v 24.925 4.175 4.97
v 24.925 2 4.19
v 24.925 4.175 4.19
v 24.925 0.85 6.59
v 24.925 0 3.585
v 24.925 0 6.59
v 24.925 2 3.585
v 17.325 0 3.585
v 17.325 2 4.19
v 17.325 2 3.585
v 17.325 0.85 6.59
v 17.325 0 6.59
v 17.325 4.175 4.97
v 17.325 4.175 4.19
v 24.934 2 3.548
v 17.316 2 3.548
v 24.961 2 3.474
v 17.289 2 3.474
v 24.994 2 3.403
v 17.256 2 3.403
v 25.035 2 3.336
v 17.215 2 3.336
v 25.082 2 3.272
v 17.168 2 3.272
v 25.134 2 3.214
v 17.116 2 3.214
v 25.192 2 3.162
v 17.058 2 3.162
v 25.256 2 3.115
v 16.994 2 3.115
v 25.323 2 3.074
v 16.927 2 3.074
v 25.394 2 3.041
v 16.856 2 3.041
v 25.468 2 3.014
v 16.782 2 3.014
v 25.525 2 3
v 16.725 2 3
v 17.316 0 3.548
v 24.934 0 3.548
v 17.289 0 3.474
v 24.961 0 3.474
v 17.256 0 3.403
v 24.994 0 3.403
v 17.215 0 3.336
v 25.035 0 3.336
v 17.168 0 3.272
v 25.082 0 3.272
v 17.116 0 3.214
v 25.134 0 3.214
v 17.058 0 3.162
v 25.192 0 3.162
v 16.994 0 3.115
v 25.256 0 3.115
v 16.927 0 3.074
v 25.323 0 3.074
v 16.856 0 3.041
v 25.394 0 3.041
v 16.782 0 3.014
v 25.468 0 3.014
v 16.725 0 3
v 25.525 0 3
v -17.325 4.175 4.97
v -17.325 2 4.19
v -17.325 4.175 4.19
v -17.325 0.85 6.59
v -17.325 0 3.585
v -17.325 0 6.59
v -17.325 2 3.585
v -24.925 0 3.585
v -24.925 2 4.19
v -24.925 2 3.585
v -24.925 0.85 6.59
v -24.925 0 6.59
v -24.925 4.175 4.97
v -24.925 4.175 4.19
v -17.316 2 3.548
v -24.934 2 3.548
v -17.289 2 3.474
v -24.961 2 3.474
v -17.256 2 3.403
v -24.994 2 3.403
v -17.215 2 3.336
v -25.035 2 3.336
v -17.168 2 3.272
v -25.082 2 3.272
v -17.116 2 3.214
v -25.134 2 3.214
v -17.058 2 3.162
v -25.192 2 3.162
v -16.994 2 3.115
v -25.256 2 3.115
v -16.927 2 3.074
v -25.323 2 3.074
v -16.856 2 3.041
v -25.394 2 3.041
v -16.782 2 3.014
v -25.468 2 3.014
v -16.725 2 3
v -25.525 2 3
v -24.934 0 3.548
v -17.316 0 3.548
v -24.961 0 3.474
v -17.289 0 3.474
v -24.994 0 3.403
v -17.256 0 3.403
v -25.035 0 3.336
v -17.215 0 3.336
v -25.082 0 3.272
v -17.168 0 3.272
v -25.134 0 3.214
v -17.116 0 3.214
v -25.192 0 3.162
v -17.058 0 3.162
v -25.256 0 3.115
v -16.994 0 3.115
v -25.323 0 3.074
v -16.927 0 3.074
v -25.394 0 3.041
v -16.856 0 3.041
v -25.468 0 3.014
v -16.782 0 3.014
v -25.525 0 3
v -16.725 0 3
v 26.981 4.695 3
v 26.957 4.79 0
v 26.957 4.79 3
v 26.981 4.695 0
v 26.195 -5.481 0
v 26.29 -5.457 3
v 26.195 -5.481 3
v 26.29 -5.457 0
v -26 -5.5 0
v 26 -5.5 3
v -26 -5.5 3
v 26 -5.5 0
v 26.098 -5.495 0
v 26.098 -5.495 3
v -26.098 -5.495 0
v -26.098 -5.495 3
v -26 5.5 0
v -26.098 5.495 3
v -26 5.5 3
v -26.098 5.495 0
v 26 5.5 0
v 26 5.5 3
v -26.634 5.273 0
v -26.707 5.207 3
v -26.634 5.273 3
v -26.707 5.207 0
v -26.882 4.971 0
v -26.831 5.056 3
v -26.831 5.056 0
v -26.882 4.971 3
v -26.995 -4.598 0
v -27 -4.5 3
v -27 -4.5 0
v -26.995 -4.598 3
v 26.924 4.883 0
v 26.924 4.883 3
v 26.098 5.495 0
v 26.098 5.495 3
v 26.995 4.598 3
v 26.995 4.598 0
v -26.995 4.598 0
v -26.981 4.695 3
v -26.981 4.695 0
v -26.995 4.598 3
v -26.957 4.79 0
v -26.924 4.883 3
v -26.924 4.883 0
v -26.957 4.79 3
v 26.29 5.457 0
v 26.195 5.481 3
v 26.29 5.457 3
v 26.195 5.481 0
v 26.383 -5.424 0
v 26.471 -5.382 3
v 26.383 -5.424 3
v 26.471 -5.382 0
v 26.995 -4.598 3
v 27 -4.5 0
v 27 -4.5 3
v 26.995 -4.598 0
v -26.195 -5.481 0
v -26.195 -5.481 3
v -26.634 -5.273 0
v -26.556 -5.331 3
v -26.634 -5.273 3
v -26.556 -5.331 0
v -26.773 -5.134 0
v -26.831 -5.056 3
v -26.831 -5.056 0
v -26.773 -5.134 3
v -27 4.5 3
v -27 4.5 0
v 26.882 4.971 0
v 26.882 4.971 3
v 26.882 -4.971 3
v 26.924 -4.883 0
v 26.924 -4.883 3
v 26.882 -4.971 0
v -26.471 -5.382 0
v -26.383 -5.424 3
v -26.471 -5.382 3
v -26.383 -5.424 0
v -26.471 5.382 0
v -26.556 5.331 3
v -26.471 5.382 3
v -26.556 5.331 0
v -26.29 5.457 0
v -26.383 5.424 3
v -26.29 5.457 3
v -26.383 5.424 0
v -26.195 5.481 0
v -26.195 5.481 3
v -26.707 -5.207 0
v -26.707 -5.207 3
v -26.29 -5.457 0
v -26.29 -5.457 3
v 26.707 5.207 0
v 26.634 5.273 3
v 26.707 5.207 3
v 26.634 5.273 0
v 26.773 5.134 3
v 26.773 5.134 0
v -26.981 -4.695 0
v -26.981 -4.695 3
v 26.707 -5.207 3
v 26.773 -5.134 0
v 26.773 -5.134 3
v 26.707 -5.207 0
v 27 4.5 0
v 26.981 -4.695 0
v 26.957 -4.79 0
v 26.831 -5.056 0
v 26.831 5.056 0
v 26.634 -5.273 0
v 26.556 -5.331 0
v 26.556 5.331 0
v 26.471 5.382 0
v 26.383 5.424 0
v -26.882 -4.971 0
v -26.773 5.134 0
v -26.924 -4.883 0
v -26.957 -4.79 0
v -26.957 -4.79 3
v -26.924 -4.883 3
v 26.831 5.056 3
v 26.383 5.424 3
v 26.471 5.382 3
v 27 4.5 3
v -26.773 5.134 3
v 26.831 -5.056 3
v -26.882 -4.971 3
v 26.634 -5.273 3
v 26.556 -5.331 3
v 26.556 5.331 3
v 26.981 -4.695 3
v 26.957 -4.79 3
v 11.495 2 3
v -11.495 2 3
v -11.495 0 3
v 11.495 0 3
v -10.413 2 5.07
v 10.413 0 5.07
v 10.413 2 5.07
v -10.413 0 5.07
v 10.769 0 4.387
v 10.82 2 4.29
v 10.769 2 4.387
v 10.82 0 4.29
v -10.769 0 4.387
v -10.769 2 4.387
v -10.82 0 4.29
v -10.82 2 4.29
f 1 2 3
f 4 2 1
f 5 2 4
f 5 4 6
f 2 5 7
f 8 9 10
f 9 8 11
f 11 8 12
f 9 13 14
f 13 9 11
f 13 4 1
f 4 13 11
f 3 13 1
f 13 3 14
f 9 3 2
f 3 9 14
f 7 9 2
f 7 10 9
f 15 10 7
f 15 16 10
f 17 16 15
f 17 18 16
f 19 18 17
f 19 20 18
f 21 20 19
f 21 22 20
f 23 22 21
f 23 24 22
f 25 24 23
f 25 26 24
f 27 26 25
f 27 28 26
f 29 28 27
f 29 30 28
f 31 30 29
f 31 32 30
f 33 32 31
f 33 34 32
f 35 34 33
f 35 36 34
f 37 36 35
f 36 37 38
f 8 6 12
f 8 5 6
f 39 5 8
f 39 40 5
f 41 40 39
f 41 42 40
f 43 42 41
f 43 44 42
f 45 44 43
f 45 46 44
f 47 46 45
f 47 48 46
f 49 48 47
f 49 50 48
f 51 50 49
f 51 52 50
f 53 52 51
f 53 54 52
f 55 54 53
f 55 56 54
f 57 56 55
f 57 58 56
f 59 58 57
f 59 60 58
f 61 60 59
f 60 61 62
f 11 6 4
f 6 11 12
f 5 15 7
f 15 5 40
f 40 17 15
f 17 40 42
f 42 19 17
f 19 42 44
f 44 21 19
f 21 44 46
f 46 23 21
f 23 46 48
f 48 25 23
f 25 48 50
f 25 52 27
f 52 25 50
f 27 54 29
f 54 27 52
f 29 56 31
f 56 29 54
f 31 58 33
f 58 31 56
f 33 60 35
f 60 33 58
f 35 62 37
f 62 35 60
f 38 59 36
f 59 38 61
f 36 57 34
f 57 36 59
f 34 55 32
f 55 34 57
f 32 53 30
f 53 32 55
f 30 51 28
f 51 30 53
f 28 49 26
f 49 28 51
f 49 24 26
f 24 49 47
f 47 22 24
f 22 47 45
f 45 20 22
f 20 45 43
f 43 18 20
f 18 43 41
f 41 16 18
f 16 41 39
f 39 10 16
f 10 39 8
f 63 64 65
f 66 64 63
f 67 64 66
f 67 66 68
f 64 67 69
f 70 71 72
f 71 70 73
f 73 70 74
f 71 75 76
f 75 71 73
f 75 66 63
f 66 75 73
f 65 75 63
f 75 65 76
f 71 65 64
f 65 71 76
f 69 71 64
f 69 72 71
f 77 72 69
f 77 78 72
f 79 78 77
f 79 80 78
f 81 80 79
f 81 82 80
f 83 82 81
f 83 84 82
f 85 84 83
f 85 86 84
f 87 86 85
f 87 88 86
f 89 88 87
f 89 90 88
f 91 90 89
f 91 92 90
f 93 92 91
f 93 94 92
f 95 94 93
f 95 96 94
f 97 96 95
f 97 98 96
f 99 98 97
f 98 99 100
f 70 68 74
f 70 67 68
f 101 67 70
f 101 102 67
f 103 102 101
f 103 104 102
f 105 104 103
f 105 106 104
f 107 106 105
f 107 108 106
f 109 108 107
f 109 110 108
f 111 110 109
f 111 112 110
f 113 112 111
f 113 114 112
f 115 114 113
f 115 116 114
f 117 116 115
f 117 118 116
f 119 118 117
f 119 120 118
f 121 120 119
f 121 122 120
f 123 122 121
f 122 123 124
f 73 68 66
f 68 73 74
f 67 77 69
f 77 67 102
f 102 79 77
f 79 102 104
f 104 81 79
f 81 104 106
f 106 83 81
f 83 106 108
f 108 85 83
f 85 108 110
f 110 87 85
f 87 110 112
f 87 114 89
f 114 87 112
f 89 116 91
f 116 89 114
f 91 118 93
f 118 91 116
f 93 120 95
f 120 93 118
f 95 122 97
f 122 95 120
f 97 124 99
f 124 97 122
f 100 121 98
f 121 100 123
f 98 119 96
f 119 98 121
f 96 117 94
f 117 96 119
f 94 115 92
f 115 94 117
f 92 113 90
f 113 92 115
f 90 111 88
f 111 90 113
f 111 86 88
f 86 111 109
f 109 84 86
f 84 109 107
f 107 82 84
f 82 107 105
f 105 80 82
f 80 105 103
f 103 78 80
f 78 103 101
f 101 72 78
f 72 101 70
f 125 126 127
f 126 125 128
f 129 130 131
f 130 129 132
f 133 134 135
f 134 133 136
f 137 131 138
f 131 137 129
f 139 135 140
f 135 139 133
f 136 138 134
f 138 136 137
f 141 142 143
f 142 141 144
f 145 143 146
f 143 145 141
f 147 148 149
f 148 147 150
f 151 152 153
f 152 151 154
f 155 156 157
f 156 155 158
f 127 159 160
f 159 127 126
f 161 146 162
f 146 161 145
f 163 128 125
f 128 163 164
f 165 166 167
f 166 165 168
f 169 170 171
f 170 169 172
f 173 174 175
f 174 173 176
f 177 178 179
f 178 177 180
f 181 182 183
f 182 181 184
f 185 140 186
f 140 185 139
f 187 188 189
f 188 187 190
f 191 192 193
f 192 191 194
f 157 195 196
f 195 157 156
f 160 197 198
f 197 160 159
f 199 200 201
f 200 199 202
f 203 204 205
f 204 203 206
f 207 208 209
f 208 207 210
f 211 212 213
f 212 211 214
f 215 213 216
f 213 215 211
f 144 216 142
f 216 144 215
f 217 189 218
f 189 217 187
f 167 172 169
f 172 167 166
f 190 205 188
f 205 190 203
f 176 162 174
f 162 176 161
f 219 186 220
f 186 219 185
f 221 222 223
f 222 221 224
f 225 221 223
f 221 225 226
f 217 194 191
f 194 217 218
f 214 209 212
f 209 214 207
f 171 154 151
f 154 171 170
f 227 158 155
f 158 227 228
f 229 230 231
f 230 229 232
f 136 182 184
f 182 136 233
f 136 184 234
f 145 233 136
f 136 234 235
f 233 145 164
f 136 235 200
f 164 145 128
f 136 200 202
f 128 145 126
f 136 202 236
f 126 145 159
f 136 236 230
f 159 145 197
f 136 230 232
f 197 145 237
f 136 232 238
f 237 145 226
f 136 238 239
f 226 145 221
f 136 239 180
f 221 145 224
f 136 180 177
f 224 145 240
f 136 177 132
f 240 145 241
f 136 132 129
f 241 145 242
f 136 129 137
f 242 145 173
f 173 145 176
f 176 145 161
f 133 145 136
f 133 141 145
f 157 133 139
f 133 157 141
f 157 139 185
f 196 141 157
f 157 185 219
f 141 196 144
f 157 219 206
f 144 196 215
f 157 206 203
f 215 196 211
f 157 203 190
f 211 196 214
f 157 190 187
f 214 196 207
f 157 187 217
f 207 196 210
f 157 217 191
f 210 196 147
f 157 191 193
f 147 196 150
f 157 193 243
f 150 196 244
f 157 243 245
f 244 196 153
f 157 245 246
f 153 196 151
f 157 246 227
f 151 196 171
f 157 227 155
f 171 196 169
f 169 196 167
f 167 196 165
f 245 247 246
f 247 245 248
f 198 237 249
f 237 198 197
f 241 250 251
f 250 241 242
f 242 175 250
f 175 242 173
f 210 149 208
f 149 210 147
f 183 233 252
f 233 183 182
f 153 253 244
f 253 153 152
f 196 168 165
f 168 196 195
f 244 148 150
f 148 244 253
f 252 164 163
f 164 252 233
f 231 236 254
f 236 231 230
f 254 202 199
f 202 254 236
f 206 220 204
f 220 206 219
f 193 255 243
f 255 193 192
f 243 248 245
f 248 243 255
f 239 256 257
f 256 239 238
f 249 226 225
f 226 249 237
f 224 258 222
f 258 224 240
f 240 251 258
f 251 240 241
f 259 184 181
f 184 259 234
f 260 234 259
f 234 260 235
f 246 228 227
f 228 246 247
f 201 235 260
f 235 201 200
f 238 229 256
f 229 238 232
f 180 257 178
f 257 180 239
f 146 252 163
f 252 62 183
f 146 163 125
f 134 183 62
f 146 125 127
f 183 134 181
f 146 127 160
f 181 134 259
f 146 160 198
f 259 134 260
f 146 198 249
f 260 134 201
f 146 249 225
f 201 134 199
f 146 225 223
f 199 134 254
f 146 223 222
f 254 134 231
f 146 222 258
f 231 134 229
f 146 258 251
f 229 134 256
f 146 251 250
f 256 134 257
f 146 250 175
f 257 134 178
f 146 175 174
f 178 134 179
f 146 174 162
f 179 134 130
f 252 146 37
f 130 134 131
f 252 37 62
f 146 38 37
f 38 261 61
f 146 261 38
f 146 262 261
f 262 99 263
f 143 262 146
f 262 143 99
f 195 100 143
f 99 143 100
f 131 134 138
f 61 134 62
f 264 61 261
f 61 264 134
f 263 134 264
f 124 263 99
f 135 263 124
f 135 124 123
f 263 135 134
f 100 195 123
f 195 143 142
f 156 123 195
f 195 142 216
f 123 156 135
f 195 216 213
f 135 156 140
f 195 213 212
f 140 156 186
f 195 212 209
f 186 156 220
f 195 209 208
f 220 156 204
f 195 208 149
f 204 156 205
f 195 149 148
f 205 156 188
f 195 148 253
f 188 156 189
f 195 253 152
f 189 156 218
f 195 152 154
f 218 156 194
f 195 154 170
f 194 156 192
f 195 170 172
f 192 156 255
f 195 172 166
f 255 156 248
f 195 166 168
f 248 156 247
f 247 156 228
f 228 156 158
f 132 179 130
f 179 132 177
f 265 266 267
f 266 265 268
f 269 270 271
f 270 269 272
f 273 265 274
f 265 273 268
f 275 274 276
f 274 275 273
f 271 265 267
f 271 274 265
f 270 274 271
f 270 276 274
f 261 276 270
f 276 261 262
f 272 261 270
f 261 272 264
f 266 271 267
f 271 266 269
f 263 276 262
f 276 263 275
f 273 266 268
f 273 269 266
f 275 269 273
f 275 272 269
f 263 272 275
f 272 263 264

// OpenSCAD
// file: gusset.scad
//
// Copyright (c) Stewart H. Whitman, 2024.
//
// File:    gusset.scad
// Project: General
// License: CC BY-NC-SA 4.0 (Attribution-NonCommercial-ShareAlike)
// Desc:    Gusset shapes to fill in |_ corners
//

include <smidge.scad>;

// Quadrant Setting:
//        y
//       2|1
//      --+-- x
//       3|4

module round_gusset_2d( w, quadrant=1 ) {
  assert( is_num(quadrant) && (quadrant == 1 || quadrant==2 || quadrant==3 || quadrant==4) );

  quadrant_to_mirror = [ [0,0], [1,0], [1,1], [0,1] ];

  mirror( quadrant_to_mirror[quadrant-1] )
    difference() {
      square( [ w, w ] );
      translate( [w-SMIDGE,w-SMIDGE] ) circle( r=w );
    }
} // end round_gusset_2d

module oblate_gusset_2d( w, h, quadrant=1 ) {
  scale( [1,h/w] ) round_gusset_2d( w, quadrant );
} // end oblate_gusset_2d

module round_gusset_3d( w, d, quadrant=1 ) {
  linear_extrude( height=d ) round_gusset_2d( w, quadrant );
} // end round_gusset_3d

module oblate_gusset_3d( w, h, d, quadrant=1 ) {
  linear_extrude( height=d ) oblate_gusset_2d( w, h, quadrant );
} // end oblate_gusset_3d

//round_gusset_2d( 10, quadrant=1 );
//oblate_gusset_2d( 10, 20, quadrant=2 );
//round_gusset_3d( 10, 1, quadrant=3 );
//oblate_gusset_3d( 10, 20, 1, quadrant=4 );
// file: mitered.scad
//
// Copyright (c) Stewart H. Whitman, 2024.
//
// File:    mitered.scad
// Project: General
// License: CC BY-NC-SA 4.0 (Attribution-NonCommercial-ShareAlike)
// Desc:    Mitered cube utilities
//

include <rounded.scad>;

// mitered_adjusted_square:
//
// Get the square <size> adjusted for angular expansion.
//
function mitered_adjusted_square( size, x_angle, y_angle ) =
   [ size.x, size.y ] + 2*size.z*[ 1/tan(x_angle), 1/tan(y_angle) ];

// mitered_cube:
//
// Scale a cube of <size> with angles of <x_angle> and <y_angle>. If not <inside>
// then the cube base is expanded and the top will be <size>, otherwise the
// base is retained and the top will be shrunken.
//
module mitered_cube( size, x_angle=90, y_angle=90, inside=true ) {
  assert( is_list( size ) );
  assert( len( size ) == 3 );
  assert( is_num( x_angle ) );
  assert( is_num( y_angle ) );

  if( size.z > 0 ) {
    assert( size.x > 0 );
    assert( size.y > 0 );

    // Calculate squares
    smaller_size = [ size.x, size.y ];
    larger_size  = mitered_adjusted_square( size, x_angle, y_angle );

    // Sanity check sizes
    assert( larger_size.x > 0 );
    assert( larger_size.y > 0 );

    // Scale always larger to smaller
    scale_factor = [ smaller_size.x / larger_size.x, smaller_size.y / larger_size.y ];

    // Extrude a scaled square
    linear_extrude( height=size.z, scale=scale_factor )
      square( inside ? smaller_size : larger_size, center=true );
  }
} // end mitered_cube

// mitered_rounded_cube:
//
// Scale a rounded cube of <size> with angles of <x_angle> and <y_angle>. If not <inside>
// then the cube base is expanded and the top will be <size>, otherwise the
// base is retained and the top will be shrunken.
//
module mitered_rounded_cube( size, radius=0, x_angle=90, y_angle=90, inside=true ) {
  assert( is_list( size ) );
  assert( len( size ) == 3 );
  assert( is_num( x_angle ) );
  assert( is_num( y_angle ) );
  assert( is_num( radius ) );

  if( size.z > 0 ) {
    assert( size.x > 0 );
    assert( size.y > 0 );

    // Calculate squares
    smaller_size = [ size.x, size.y ];
    larger_size  = mitered_adjusted_square( size, x_angle, y_angle );

    // Sanity check sizes
    assert( larger_size.x > 0 );
    assert( larger_size.y > 0 );

    // Scale always larger to smaller
    scale_factor = [ smaller_size.x / larger_size.x, smaller_size.y / larger_size.y ];

    // Extrude a scaled square
    linear_extrude( height=size.z, scale=scale_factor )
      rounded_side_square( inside ? smaller_size : larger_size, radius, center=true );
  }
} // end mitered_rounded_cube

//mitered_cube( [10,4,3], x_angle=30 );
//translate( [0,6,0] ) mitered_cube( [10,4,3], x_angle=30, inside=false );
//translate( [0,12,0] ) mitered_cube( [10,4,3], x_angle=60, y_angle=20, inside=true );
//mitered_cube( [10,4,3], x_angle=30 );
//translate( [0,6,0] ) mitered_cube( [10,4,3], x_angle=30, inside=false );
//translate( [0,12,0] ) mitered_cube( [10,4,3], x_angle=60, y_angle=20, inside=true );
// file: rounded.scad
//
// Copyright (c) Stewart H. Whitman, 2020-2024.
//
// File:    rounded.scad
// Project: General
// License: CC BY-NC-SA 4.0 (Attribution-NonCommercial-ShareAlike)
// Desc:    Rounded square/cube/cylinder utilities
//

// rounded_side_square:
//
// Generate a square of <size> with a round-over <radius> in
// the X and Y directions. Centered optionally like a square.
//
module rounded_side_square( size, radius, center=false ) {
  assert( is_num(size) || is_list(size) );
  assert( is_num(radius) && radius >= 0 );

  c = is_list(size) ? size : [size,size];

  assert( len(c) == 2 );
  assert( is_num(c.x) );
  assert( is_num(c.y) );
  assert( c.x > 2*radius );
  assert( c.y > 2*radius );

  offset( r=radius )
    offset( delta=-radius )
      square( c, center=center );
} // end rounded_side_square

// rounded_side_cube:
//
// Generate a cube of <size> with a round-over <radius> in
// the X and Y directions. Centered optionally like a cube.
//
module rounded_side_cube( size, radius, center=false ) {
  assert( is_num(size) || is_list(size) );

  c = is_list(size) ? size : [size,size,size];

  assert( len(c) == 3 );
  assert( is_num(c.z) );

  linear_extrude( height=c.z, center=center )
    rounded_side_square( [c.x,c.y], radius, center );
} // end rounded_side_cube

// rounded_side_cube_upper:
//
// Generate a cube of <size> with a round-over <radius> in
// the X and Y directions. The object is centered on X and Y but
// with Z positive.
//
module rounded_side_cube_upper( size, radius ) {
  assert( is_num(size) || is_list(size) );

  c = is_list(size) ? size : [size,size,size];

  assert( len(c) == 3 );
  assert( is_num(c.z) );

  linear_extrude( height=c.z )
    rounded_side_square( [c.x,c.y], radius, true );
} // end rounded_side_cube_upper

// rounded_top_cylinder:
//
// Generate a cylinder with a rounded top, with <d,r,h> parameters
// like cylinder, but <radius> defines the round-over radius.
//
module rounded_top_cylinder( h, d, r, radius, center=false ) {
  assert( is_num(h) && h > 0 );
  assert( (is_undef(r) || is_undef(d)) && (is_num(r) || is_num(d)) ); // Not both
  assert( is_num(radius) );
  assert( h > radius );

  cylinder_radius = is_undef(d) ? r : d/2;
  assert( cylinder_radius > radius );

  translate( [0,0,(center?-h/2:0)] )
    rotate_extrude()
      intersection() {
        offset( r=+radius ) offset( delta=-radius ) square( [ 2*cylinder_radius, 2*h ], center=true );
        square( [cylinder_radius,h] );
      }
} // end rounded_top_cylinder

// rounded_top_and_bottom_cylinder:
//
// Generate a cylinder with a rounded top and bottom, with <d,r,h> parameters
// like cylinder, but <radius> defines the round-over radius.
//
module rounded_top_and_bottom_cylinder( h, d, r, radius, center=false ) {
  assert( is_num(h) && h > 0 );
  assert( (is_undef(r) || is_undef(d)) && (is_num(r) || is_num(d)) ); // Not both
  assert( is_num(radius) );
  assert( h > radius );

  cylinder_radius = is_undef(d) ? r : d/2;
  assert( cylinder_radius > radius );

  translate( [0,0,(center?-h/2:0)] )
    rotate_extrude()
      intersection() {
        translate( [-cylinder_radius, 0 ] ) offset( r=+radius ) offset( delta=-radius ) square( [ 2*cylinder_radius, h ], center=false );
	square( [cylinder_radius,h] );
      }
} // end rounded_top_and_bottom_cylinder

// rounded_top_cube:
//
// Generate a cube of <size> with a round-over <radius> in
// the X, Y, and top Z directions. Centered optionally like a cube.
//
module rounded_top_cube( size, radius, center=false ) {
  assert( is_num(size) || is_list(size) );
  assert( is_num(radius) && radius >= 0 );

  size_v = is_list(size) ? size : [size,size,size];

  rounded_top_volume( size_v, radius, center ? [0,0,0] : size_v/2 ) cube(size_v,center=center);
} // end rounded_top_cube

// rounded_top_cube_upper:
//
// Generate a cube of <size> with a round-over <radius> in
// the X, Y, and top Z directions. The object is centered on X and Y but
// with Z positive.
//
module rounded_top_cube_upper( size, radius ) {
  assert( is_num(size) || is_list(size) );

  size_v = is_list(size) ? size : [size,size,size];

  translate( [ 0, 0, size_v.z/2 ] ) rounded_top_cube( size_v, radius, center=true );
} // end rounded_top_cube_upper

// rounded_all_cube:
//
// Generate a cube of <size> with a round-over <radius> in
// all X, Y, and Z directions. Centered optionally like a cube.
//
module rounded_all_cube( size, radius, center=false ) {
  assert( is_num(size) || is_list(size) );
  assert( is_num(radius) && radius >= 0 );

  size_v = is_list(size) ? size : [size,size,size];

  rounded_all_volume( size_v, radius, center ? [0,0,0] : size_v/2 ) cube(size_v,center=center);
} // end rounded_all_cube

// rounded_all_cube_upper:
//
// Generate a cube of <size> with a round-over <radius> in
// all X, Y, and Z directions. The object is centered on X and Y but
// with Z positive.
//
module rounded_all_cube_upper( size, radius ) {
  assert( is_num(size) || is_list(size) );

  size_v = is_list(size) ? size : [size,size,size];

  translate( [ 0, 0, size_v.z/2 ] ) rounded_all_cube( size_v, radius, center=true );
} // end rounded_all_cube_upper

// rounded_top_volume:
//
// Operates on its children creating a round-over effect based
// on <radius>. Operations are:
//    1. Translate volume from <c> to origin
//    2. Scale X/Y volume down based-on the radius to be added in step 3
//    3. Minkowski with sphere adding 2*radius in all dimensions
//    4. Remove rounded over bottom radius:
//     a. Translate down a radius
//     b. Intersect with full volume
//    5. Restore volume to <c>
//
module rounded_top_volume( volume, radius, c=[0,0,0] ) {
  assert( is_num(radius) && radius >= 0 );
  assert( is_list(volume) && len(volume) == 3 );
  assert( is_num(volume.x) && volume.x > 2*radius );
  assert( is_num(volume.y) && volume.y > 2*radius );
  assert( is_list(c) && len(c) == 3 );

  if( radius > 0 ) {
    delta        = volume - 2*[radius, radius, 0];
    scale_factor = [delta.x/volume.x, delta.y/volume.y, 1 ];

    translate(c) intersection() {
      cube( volume, center=true );
      translate([0, 0, -radius ] ) minkowski() {
	scale( scale_factor ) translate(-c) children();
	sphere( r=radius );
      }
    }
  }
  else
    children();
} // end rounded_top_volume

// rounded_all_volume:
//
// Operates on its children creating a round-over effect based
// on <radius>. Operations are:
//    1. Translate volume from <c> to origin
//    2. Scale X/Y/Z volume down based-on the radius to be added in step 3
//    3. Minkowski with sphere adding 2*radius in all dimensions
//    4. Intersect with full volume
//    5. Restore volume to <c>
//
module rounded_all_volume( volume, radius, c=[0,0,0] ) {
  assert( is_num(radius) && radius >= 0 );
  assert( is_list(volume) && len(volume) == 3 );
  assert( is_num(volume.x) && volume.x > 2*radius );
  assert( is_num(volume.y) && volume.y > 2*radius );
  assert( is_num(volume.z) && volume.z > 2*radius );
  assert( is_list(c) && len(c) == 3 );

  if( radius > 0 ) {
    delta        = volume - 2*[radius, radius, radius];
    scale_factor = [delta.x/volume.x, delta.y/volume.y, delta.z/volume.z ];

    translate(c) intersection() {
      cube( volume, center=true );
      minkowski() {
	scale( scale_factor ) translate(-c) children();
	sphere( r=radius );
      }
    }
  }
  else
    children();
} // end rounded_all_volume
// file: smidge.scad
//
// Copyright (c) Stewart H. Whitman, 2021-2024.
//
// File:    smidge.scad
// Project: General
// License: CC BY-NC-SA 4.0 (Attribution-NonCommercial-ShareAlike)
// Desc:    SMIDGE constant used in preview mode.
//

// Smidge constant for rendering only (to avoid Z-axis fighting, etc.)
SMIDGE = 0.01;
// main file
//
// Copyright (c) Stewart H. Whitman, 2022-2024.
//
// File:    hp-z6-catch-top.scad
// Project: HP Z6 G4 Memory Fan Mounts
// License: CC BY-NC-SA 4.0 (Attribution-NonCommercial-ShareAlike)
// Desc:    HP Z6 G4 Top Front Fan Cage Catch Definitions
//

include <smidge.scad>;
include <rounded.scad>;
include <mitered.scad>;
include <gusset.scad>;

// Catch:
//
// Catch refers to the top area of the "mound". Radius
// is nominal.
//
// top_catch_size: length, width
top_catch_size = [ 54, 11 ];
top_catch_radius = 1;

// Slot:
//
// Two slots, centered atop the long axis and positioned
// symmetrically about the vertical center. Depth is the
// amount of "safe" space behind metal.
//
// top_slot_size: length, width, depth
top_slot_size = [ 8.25, 5.5, 4 ];
top_slot_separation = 34;
top_slot_centers = (top_slot_separation + top_slot_size.x)/2 * [ [ 1, 0 ], [ -1, 0 ] ];
top_slot_spacer = 1.2;
top_slot_gusset = 0.8;

// Box:
//
// Not really part of the catch, this is the depression
// between the slots in the center of the slots.
//
top_box_size = [ 23, top_slot_size.y-1.5, 2.6 ];
top_box_center = [ 0, 0 ];

// Fitting (tolerance) properties:
//
// These have been adapted to approximate the OEM tabs which measure:
//   [ width, height (excess), depth ] = [ 7.6, 1.4, 3.65 ]
//
top_tang_multiplier = [ 0.92, 0.9, 0.9 ];
//top_box_multiplier = 0.9;
top_box_multiplier = 0.8;
top_hollow_thickness = 0.8;

// For layout testing: (match main mount file)
top_layout_offsets = [6.3, 85.6, 9.055];

// top_catch_rounded_hollow: rounded hollow cube
module top_catch_rounded_hollow( size, radius, thickness ) {
  difference() {
    rounded_side_cube_upper( size, top_catch_radius/3);
    translate( [0,0,-SMIDGE] )
      rounded_side_cube_upper( size - 2 * [top_hollow_thickness, top_hollow_thickness, -SMIDGE ], top_catch_radius/3 );
  }
} // end top_catch_rounded_hollow

// top_tang_simple: angled tang
module top_tang_simple( tip_profile, tang_profile, notch_profile ) {
  assert( is_list(tip_profile) && len(tip_profile) == 3 );
  assert( is_list(tang_profile) && len(tang_profile) == 3 );
  assert( is_list(notch_profile) && len(notch_profile) == 2 );

  function round_to_tenths(v) = round(10*v)/10;

  tip_width     = tip_profile[0];
  tip_thickness = tip_profile[1];
  tip_depth     = tip_profile[2];

  tang_height_percentage = tang_profile[0];
  tang_angle             = tang_profile[1];
  tang_pivot_percentage  = tang_profile[2];

  tang_height            = tang_height_percentage / 100 * tip_thickness;
  tang_pivot             = tang_pivot_percentage / 100 * tip_thickness;

  notch_depth  = notch_profile[0];
  notch_height = notch_profile[1];

  tang_length = tang_height > 0 ? tang_pivot+(tip_thickness+tang_height/2)/tan(tang_angle) : 0;

  // y => thickness of the top
  // p => pivot point on the top
  // h => indent size
  // l => length of the tang
  // w => width of the tang
  let( y = tip_thickness, p = tang_pivot, h = round_to_tenths(tang_height), l = round_to_tenths(tang_length), w=round_to_tenths(tip_width), ni = notch_depth, nh = notch_height ) {
    //echo( "top tang [ width, height, depth ] =",  [w, h, l] );
    linear_extrude( height=w, center=true, convexity=20 ) {
      polygon([ [0,0], [0,nh], [ni,nh], [ni,y+h], [p,y+h], [l,+h/2], [l,0] ]);
    }
  }
} // end tang_simple

// top_tang_elliptical: ellipsoid tang
module top_tang_elliptical( tip_profile, tang_profile, notch_profile ) {
  assert( is_list(tip_profile) && len(tip_profile) == 3 );
  assert( is_list(tang_profile) && len(tang_profile) == 3 );
  assert( is_list(notch_profile) && len(notch_profile) == 2 );

  function round_to_tenths(v) = round(10*v)/10;

  tip_width     = tip_profile[0];
  tip_thickness = tip_profile[1];
  tip_depth     = tip_profile[2];

  tang_height_percentage = tang_profile[0];
  tang_angle             = tang_profile[1];
  tang_pivot_percentage  = tang_profile[2];

  tang_height = tang_height_percentage / 100 * tip_thickness + tip_thickness;
  tang_pivot  = tang_pivot_percentage  / 100 * tang_height;

  notch_depth  = notch_profile[0];
  notch_height = notch_profile[1];

  width_multiplier = 1.15;

  module ellipsoid(w, h, d) { scale([1, h/w, d/w]) sphere(r=w/2); }

  // h => height
  // w => width
  // d => depth
  // p => pivot height
  // o => pivot indent location (based on angle)
  let( h = round_to_tenths(tang_height), w = round_to_tenths(tip_width), d = round_to_tenths(tip_depth), p = tang_pivot, o = notch_depth + (h-p)*sin(tang_angle), ni = notch_depth, nh = notch_height ) {
    //echo( "top tang [ width, height, depth ] =",  [w, round_to_tenths(h-tip_thickness), d] );
    intersection() {
      // A little oversize across width (which will be clipped)
      ellipsoid( 2*d, 2*h, width_multiplier*w );

      // Bounding box
      linear_extrude( height=w, center=true, convexity=20 )
	polygon([ [0,0], [0,nh], [ni,nh], [ni,p], [o,h], [d,h], [d,0] ]);
    }
  }
} // end tang_elliptical

// top_catch_tang: the two top tangs
module top_catch_tang(style, thickness) {
  size = [ top_tang_multiplier.x * top_slot_size.x,
           top_tang_multiplier.y * top_slot_size.y,
           top_tang_multiplier.z * top_slot_size.z ];

  // none: nothing
  if( style == "none" ) {
    ;
  }
  // debug: just cubes (for fitting)
  else if( style == "debug" ) {
    rounded_side_cube_upper( top_slot_size, radius=0 );
  }
  // full: straight just scaled by percentage (for fitting)
  else if( style == "full" ) {
    top_catch_rounded_hollow( size, top_catch_radius/3, top_hollow_thickness );
  }
  // hook: insertion hooks
  else if( style == "hook" ) {
    // Width and height of hook
    tip_profile  = [ size.x, size.y/2, size.z ];

    // Profile of hook
    tang_profile = [ 70, 64, 80 ];

    // Profile of notch
    notch_profile = [ top_slot_spacer, thickness ];

    // Tang
    rotate( [0,-90,0] )
      top_tang_simple( tip_profile, tang_profile, notch_profile );

    // Gussets
    translate( [ +size.x/2-SMIDGE, 0, 0 ] ) rotate( [-90, -90, 0 ] ) round_gusset_3d( top_slot_gusset, thickness, quadrant=1 );
    translate( [ -size.x/2+SMIDGE, 0, 0 ] ) rotate( [-90, -90, 0 ] ) round_gusset_3d( top_slot_gusset, thickness, quadrant=4 );
  }
  // hook-elliptical:
  else if( style == "hook-elliptical" ) {
    // Width and height of hook
    tip_profile  = [ size.x, size.y/2, size.z ];

    // Profile of hook
    tang_profile = [ 70, 30, 70 ];

    // Profile of notch
    notch_profile = [ top_slot_spacer, thickness ];

    // Tang
    rotate( [0,-90,0] )
      top_tang_elliptical( tip_profile, tang_profile, notch_profile );

    // Gussets
    translate( [ +size.x/2-SMIDGE, 0, 0 ] ) rotate( [-90, -90, 0 ] ) round_gusset_3d( top_slot_gusset, thickness, quadrant=1 );
    translate( [ -size.x/2+SMIDGE, 0, 0 ] ) rotate( [-90, -90, 0 ] ) round_gusset_3d( top_slot_gusset, thickness, quadrant=4 );
  }
  else {
    assert( false, "top_catch_tang: style unknown!" );
  }
} // end top_catch_tang

// sparsifyX: remove a number of cells
module sparsifyX( cells, size, remainder ) {
  height = size.z - 2*remainder;
  if( height > 0 ) {
    count  = 2*cells+1;
    width  = size.x/count;

    cell_size = [ width, size.y+2*SMIDGE, height ];
    for( i = [1:count] ) {
      if( i%2==0 ) {
	translate( [width*i-size.x/2-width/2,0,remainder+height/2] )
	  cube( cell_size, center=true );
      }
    }
  }
} // end sparsifyX

module top_catch_base( style, height ) {
  size = concat( top_catch_size, height );

  if( style == "none" || height <= 0 ) {
    ;
  }
  // full: straight just scaled by percentage
  else if( style == "full" ) {
    rounded_side_cube_upper( size, top_catch_radius );
  }
  // layout: test out the distance to cage
  else if( style == "layout" ) {
    echo( "top tab layout offset =", top_layout_offsets );

    difference() {
      rounded_side_cube_upper( size, top_catch_radius );
      sparsifyX( 4, size, 2 );
    }

    // Down prong to bottom catch center
    {
      catch_center_to_bottom = size.z > 7 ? top_layout_offsets.y : 12;
      catch_center_to_mid    = -top_layout_offsets.x;
      translate( [-catch_center_to_mid,+catch_center_to_bottom/2,0] )
        rounded_side_cube_upper( [3, catch_center_to_bottom, min(size.z,3)], 0 );
    }
  }
  else {
    assert( false, "top_catch_base: style unknown!" );
  }
} // end top_catch_base

module top_catch_box(style,thickness) {
  size = [ top_box_size.x,
           top_box_size.y,
           (style == "full") ? top_box_size.z : top_box_multiplier*top_box_size.z ];

  // none: nothing
  if( style == "none" ) {
    ;
  }
  // debug: just flat panel
  else if( style == "debug" ) {
    // N.B.: show blocker position
    translate( [0,0,top_box_size.z] )
      rounded_side_cube_upper( [ size.x, size.y, 1 ], radius=0 );
  }
  // full: just a box
  else if( style == "full" ) {
    top_catch_rounded_hollow( size, top_catch_radius/3, top_hollow_thickness );
  }
  // hook: matching box for hooks
  else if( style == "hook" ) {
    translate( [0,thickness/2,0] )
      mitered_cube( [ size.x, thickness, size.z ], x_angle=60 );
  }
  else {
    assert( false, "top_catch_box: style unknown!" );
  }
} // end top_catch_box

module top_catch_fitting(height=3,base_style="full",tang_style="full",box_style="full",thickness=2) {
  assert( is_num(height) && height >= 0 );

  difference() {
    union() {
      // Base
      top_catch_base( base_style, height );

      // Box
      translate( concat( top_box_center, height-SMIDGE ) )
	top_catch_box( box_style, thickness );

      // Slot projection
      for( p = top_slot_centers )
        translate( concat( p, height-SMIDGE ) )
          top_catch_tang( tang_style, thickness );
    }
  }
} // end top_catch_fitting

// top_catch_get_size, top_catch_get_below_size:
//
// Returns [ length, width, height above/below case ]
//
function top_catch_get_size()         = concat( top_catch_size, top_slot_size.z );
function top_catch_get_slot_size()    = top_slot_size;
function top_catch_get_slot_centers() = top_slot_centers;
function top_catch_get_box_size()     = top_box_size;
function top_catch_get_box_center()   = top_box_center;

$fn = 64;
//top_catch_fitting( height=3, base_style="full", tang_style="full");
//top_catch_fitting( height=top_layout_offsets.z, base_style="layout", tang_style="full", box_style="full");
//top_catch_fitting( height=2.4, base_style="layout", tang_style="full", box_style="full");
top_catch_fitting( height=3, base_style="full", tang_style="hook", box_style="hook");
//top_catch_fitting( height=3, base_style="full", tang_style="hook-elliptical", box_style="hook");
//translate( [0,0,3] ) color( "black", 0.10 ) top_catch_fitting( height=0, tang_style="debug", box_style="debug" );
